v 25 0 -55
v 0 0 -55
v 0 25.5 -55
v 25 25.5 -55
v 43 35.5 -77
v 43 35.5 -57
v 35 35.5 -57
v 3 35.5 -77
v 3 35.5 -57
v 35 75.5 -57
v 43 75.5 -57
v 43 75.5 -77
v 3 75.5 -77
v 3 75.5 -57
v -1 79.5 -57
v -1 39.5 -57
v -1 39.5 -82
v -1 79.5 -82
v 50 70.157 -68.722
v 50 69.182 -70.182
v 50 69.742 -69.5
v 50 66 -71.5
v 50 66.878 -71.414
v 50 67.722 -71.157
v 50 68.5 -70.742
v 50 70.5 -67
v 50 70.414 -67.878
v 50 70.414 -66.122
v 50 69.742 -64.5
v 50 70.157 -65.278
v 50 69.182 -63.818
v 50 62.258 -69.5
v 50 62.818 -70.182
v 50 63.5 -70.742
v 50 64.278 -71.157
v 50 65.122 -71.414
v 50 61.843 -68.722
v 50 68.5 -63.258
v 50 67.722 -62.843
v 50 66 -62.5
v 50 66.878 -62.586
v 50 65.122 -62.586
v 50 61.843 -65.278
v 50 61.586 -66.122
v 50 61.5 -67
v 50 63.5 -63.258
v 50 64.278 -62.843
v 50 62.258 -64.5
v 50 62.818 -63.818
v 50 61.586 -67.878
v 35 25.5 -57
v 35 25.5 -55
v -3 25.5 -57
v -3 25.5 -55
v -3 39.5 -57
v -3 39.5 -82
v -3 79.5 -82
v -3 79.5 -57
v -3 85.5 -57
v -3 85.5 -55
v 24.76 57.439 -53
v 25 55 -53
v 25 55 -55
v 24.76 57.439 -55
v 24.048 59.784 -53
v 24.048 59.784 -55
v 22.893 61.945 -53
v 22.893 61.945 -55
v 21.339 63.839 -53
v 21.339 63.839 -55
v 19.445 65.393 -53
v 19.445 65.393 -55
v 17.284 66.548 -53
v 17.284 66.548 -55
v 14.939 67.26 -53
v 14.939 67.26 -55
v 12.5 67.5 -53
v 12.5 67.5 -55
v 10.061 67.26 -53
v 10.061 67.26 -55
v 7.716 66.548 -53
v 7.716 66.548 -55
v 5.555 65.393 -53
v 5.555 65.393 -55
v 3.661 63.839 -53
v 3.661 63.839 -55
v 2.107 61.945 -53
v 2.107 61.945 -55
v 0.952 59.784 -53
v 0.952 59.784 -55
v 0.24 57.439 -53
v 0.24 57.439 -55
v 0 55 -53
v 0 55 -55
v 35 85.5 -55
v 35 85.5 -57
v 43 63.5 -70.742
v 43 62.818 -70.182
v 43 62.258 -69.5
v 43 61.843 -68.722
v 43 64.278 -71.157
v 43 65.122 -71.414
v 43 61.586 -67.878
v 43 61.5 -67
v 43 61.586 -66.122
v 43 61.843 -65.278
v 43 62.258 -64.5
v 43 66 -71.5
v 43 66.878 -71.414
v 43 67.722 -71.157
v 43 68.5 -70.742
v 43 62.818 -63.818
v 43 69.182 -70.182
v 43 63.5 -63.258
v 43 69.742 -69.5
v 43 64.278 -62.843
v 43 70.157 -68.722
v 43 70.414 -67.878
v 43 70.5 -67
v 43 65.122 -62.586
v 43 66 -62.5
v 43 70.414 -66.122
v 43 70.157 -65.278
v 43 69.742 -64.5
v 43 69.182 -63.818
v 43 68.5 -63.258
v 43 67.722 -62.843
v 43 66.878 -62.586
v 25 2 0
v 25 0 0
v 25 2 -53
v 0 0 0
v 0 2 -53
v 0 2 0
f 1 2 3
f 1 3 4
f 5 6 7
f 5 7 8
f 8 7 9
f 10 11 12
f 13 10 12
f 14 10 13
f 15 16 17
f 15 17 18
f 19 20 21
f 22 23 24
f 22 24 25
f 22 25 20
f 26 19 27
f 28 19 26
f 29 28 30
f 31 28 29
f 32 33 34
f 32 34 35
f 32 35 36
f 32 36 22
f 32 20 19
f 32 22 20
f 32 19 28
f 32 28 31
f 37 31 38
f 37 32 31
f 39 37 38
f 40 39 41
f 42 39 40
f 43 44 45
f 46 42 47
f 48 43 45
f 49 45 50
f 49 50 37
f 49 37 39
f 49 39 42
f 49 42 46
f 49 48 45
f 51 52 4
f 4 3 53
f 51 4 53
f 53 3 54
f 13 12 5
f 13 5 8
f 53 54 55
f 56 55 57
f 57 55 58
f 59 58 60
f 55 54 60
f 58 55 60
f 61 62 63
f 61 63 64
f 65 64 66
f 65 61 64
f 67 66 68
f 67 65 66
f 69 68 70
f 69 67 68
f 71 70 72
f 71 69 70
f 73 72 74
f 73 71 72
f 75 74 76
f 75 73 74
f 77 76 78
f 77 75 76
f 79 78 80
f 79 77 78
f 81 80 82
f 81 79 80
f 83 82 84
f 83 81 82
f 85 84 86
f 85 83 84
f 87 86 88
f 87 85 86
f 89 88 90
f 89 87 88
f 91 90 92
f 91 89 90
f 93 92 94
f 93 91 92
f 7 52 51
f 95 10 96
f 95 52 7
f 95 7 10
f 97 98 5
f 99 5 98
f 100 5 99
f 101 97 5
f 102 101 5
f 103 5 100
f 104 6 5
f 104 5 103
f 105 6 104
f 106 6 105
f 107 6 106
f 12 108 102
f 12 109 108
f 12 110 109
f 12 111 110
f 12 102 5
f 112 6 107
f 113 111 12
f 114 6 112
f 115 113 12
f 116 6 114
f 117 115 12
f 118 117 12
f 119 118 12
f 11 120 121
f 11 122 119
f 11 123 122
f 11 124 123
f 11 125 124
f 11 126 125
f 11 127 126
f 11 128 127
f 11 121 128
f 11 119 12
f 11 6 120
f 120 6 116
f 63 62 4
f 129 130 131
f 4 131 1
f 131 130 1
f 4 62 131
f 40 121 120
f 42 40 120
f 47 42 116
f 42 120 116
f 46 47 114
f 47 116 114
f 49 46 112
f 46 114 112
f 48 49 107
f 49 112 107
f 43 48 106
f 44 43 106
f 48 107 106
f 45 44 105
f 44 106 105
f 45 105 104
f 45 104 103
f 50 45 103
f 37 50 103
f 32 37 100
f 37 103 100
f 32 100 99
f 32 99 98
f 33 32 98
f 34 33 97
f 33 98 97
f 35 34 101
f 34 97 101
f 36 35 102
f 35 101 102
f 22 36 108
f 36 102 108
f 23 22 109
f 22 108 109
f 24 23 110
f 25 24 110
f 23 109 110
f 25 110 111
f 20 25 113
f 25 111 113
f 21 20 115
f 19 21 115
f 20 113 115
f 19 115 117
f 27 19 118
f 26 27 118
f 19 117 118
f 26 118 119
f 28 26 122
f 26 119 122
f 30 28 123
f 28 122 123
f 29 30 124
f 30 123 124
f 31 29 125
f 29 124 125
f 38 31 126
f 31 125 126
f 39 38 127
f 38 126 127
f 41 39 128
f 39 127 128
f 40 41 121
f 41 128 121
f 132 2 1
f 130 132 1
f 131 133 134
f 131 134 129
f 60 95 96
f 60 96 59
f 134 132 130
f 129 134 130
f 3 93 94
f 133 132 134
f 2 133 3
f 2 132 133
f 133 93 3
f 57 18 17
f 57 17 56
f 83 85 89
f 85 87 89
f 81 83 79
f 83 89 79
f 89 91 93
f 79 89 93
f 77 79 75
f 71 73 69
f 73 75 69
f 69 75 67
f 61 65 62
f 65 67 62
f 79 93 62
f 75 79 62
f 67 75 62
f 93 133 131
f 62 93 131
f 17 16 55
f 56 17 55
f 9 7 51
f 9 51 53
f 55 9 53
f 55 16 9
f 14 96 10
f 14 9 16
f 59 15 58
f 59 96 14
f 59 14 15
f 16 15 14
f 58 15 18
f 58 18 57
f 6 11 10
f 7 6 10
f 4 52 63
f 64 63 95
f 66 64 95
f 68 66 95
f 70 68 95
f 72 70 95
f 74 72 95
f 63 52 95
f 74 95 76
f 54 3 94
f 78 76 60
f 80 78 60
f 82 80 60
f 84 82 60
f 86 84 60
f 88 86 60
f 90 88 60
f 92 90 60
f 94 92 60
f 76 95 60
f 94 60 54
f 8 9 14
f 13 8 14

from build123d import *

# Parameters (mm, degrees)
ESQUISSE1_W        = 25
ESQUISSE1_H        = 55
BOSS_EXTRU_1_DEPTH = 2
ESQUISSE2_W        = 25
ESQUISSE2_H        = 2
BOSS_EXTRU_2_DEPTH = 53
BOSS_EXTRU_3_DEPTH = 2
ESQUISSE6_W        = 38
ESQUISSE6_H        = 60
BOSS_EXTRU_4_DEPTH = 2
ESQUISSE7_W        = 40
ESQUISSE7_H        = 40
BOSS_EXTRU_5_DEPTH = 20
ESQUISSE9_W        = 2
ESQUISSE9_H        = 40
BOSS_EXTRU_6_DEPTH = 25
ESQUISSE8_R        = 4.5
BOSS_EXTRU_7_DEPTH = 7


with BuildPart() as part:
    # Esquisse1 → Boss.-Extru.1 (new body)
    with BuildSketch(Plane(origin=(0, 0, 0), x_dir=(1, 0, 0), z_dir=(0, 1, 0))):
        with Locations((12.5, 27.5)):
            Rectangle(ESQUISSE1_W, ESQUISSE1_H)
    extrude(amount=BOSS_EXTRU_1_DEPTH)

    # Esquisse2 → Boss.-Extru.2 (add)
    with BuildSketch(Plane(origin=(0, 2, 0), x_dir=(1, 0, 0), z_dir=(0, 1, 0))):
        with Locations((12.5, 54)):
            Rectangle(ESQUISSE2_W, ESQUISSE2_H)
    extrude(amount=BOSS_EXTRU_2_DEPTH)

    # Esquisse3 → Boss.-Extru.3 (add)
    with BuildSketch(Plane.XY.offset(-53)):
        with BuildLine():
            Line((0, 2), (25, 2))
            Line((25, 2), (25, 55))
            ThreePointArc((25, 55), (12.5, 67.5), (0, 55))
            Line((0, 55), (0, 2))
        make_face()
    extrude(amount=-BOSS_EXTRU_3_DEPTH)

    # Esquisse6 → Boss.-Extru.4 (add)
    with BuildSketch(Plane(origin=(0, 0, -55), x_dir=(-1, 0, 0), z_dir=(0, 0, -1))):
        with Locations((-16, 55.5)):
            Rectangle(ESQUISSE6_W, ESQUISSE6_H)
    extrude(amount=BOSS_EXTRU_4_DEPTH)

    # Esquisse7 → Boss.-Extru.5 (add)
    with BuildSketch(Plane(origin=(0, 0, -57), x_dir=(-1, 0, 0), z_dir=(0, 0, -1))):
        with Locations((-23, 55.5)):
            Rectangle(ESQUISSE7_W, ESQUISSE7_H)
    extrude(amount=BOSS_EXTRU_5_DEPTH)

    # Esquisse9 → Boss.-Extru.6 (add)
    with BuildSketch(Plane(origin=(0, 0, -57), x_dir=(-1, 0, 0), z_dir=(0, 0, -1))):
        with Locations((2, 59.5)):
            Rectangle(ESQUISSE9_W, ESQUISSE9_H)
    extrude(amount=BOSS_EXTRU_6_DEPTH)

    # Esquisse8 → Boss.-Extru.7 (add)
    with BuildSketch(Plane(origin=(43, 0, 0), x_dir=(0, 0, -1), z_dir=(1, 0, 0))):
        with Locations(Location((67, 66, 0), (0, 0, 180))):
            Circle(ESQUISSE8_R)
    extrude(amount=BOSS_EXTRU_7_DEPTH)


solid = part.part
